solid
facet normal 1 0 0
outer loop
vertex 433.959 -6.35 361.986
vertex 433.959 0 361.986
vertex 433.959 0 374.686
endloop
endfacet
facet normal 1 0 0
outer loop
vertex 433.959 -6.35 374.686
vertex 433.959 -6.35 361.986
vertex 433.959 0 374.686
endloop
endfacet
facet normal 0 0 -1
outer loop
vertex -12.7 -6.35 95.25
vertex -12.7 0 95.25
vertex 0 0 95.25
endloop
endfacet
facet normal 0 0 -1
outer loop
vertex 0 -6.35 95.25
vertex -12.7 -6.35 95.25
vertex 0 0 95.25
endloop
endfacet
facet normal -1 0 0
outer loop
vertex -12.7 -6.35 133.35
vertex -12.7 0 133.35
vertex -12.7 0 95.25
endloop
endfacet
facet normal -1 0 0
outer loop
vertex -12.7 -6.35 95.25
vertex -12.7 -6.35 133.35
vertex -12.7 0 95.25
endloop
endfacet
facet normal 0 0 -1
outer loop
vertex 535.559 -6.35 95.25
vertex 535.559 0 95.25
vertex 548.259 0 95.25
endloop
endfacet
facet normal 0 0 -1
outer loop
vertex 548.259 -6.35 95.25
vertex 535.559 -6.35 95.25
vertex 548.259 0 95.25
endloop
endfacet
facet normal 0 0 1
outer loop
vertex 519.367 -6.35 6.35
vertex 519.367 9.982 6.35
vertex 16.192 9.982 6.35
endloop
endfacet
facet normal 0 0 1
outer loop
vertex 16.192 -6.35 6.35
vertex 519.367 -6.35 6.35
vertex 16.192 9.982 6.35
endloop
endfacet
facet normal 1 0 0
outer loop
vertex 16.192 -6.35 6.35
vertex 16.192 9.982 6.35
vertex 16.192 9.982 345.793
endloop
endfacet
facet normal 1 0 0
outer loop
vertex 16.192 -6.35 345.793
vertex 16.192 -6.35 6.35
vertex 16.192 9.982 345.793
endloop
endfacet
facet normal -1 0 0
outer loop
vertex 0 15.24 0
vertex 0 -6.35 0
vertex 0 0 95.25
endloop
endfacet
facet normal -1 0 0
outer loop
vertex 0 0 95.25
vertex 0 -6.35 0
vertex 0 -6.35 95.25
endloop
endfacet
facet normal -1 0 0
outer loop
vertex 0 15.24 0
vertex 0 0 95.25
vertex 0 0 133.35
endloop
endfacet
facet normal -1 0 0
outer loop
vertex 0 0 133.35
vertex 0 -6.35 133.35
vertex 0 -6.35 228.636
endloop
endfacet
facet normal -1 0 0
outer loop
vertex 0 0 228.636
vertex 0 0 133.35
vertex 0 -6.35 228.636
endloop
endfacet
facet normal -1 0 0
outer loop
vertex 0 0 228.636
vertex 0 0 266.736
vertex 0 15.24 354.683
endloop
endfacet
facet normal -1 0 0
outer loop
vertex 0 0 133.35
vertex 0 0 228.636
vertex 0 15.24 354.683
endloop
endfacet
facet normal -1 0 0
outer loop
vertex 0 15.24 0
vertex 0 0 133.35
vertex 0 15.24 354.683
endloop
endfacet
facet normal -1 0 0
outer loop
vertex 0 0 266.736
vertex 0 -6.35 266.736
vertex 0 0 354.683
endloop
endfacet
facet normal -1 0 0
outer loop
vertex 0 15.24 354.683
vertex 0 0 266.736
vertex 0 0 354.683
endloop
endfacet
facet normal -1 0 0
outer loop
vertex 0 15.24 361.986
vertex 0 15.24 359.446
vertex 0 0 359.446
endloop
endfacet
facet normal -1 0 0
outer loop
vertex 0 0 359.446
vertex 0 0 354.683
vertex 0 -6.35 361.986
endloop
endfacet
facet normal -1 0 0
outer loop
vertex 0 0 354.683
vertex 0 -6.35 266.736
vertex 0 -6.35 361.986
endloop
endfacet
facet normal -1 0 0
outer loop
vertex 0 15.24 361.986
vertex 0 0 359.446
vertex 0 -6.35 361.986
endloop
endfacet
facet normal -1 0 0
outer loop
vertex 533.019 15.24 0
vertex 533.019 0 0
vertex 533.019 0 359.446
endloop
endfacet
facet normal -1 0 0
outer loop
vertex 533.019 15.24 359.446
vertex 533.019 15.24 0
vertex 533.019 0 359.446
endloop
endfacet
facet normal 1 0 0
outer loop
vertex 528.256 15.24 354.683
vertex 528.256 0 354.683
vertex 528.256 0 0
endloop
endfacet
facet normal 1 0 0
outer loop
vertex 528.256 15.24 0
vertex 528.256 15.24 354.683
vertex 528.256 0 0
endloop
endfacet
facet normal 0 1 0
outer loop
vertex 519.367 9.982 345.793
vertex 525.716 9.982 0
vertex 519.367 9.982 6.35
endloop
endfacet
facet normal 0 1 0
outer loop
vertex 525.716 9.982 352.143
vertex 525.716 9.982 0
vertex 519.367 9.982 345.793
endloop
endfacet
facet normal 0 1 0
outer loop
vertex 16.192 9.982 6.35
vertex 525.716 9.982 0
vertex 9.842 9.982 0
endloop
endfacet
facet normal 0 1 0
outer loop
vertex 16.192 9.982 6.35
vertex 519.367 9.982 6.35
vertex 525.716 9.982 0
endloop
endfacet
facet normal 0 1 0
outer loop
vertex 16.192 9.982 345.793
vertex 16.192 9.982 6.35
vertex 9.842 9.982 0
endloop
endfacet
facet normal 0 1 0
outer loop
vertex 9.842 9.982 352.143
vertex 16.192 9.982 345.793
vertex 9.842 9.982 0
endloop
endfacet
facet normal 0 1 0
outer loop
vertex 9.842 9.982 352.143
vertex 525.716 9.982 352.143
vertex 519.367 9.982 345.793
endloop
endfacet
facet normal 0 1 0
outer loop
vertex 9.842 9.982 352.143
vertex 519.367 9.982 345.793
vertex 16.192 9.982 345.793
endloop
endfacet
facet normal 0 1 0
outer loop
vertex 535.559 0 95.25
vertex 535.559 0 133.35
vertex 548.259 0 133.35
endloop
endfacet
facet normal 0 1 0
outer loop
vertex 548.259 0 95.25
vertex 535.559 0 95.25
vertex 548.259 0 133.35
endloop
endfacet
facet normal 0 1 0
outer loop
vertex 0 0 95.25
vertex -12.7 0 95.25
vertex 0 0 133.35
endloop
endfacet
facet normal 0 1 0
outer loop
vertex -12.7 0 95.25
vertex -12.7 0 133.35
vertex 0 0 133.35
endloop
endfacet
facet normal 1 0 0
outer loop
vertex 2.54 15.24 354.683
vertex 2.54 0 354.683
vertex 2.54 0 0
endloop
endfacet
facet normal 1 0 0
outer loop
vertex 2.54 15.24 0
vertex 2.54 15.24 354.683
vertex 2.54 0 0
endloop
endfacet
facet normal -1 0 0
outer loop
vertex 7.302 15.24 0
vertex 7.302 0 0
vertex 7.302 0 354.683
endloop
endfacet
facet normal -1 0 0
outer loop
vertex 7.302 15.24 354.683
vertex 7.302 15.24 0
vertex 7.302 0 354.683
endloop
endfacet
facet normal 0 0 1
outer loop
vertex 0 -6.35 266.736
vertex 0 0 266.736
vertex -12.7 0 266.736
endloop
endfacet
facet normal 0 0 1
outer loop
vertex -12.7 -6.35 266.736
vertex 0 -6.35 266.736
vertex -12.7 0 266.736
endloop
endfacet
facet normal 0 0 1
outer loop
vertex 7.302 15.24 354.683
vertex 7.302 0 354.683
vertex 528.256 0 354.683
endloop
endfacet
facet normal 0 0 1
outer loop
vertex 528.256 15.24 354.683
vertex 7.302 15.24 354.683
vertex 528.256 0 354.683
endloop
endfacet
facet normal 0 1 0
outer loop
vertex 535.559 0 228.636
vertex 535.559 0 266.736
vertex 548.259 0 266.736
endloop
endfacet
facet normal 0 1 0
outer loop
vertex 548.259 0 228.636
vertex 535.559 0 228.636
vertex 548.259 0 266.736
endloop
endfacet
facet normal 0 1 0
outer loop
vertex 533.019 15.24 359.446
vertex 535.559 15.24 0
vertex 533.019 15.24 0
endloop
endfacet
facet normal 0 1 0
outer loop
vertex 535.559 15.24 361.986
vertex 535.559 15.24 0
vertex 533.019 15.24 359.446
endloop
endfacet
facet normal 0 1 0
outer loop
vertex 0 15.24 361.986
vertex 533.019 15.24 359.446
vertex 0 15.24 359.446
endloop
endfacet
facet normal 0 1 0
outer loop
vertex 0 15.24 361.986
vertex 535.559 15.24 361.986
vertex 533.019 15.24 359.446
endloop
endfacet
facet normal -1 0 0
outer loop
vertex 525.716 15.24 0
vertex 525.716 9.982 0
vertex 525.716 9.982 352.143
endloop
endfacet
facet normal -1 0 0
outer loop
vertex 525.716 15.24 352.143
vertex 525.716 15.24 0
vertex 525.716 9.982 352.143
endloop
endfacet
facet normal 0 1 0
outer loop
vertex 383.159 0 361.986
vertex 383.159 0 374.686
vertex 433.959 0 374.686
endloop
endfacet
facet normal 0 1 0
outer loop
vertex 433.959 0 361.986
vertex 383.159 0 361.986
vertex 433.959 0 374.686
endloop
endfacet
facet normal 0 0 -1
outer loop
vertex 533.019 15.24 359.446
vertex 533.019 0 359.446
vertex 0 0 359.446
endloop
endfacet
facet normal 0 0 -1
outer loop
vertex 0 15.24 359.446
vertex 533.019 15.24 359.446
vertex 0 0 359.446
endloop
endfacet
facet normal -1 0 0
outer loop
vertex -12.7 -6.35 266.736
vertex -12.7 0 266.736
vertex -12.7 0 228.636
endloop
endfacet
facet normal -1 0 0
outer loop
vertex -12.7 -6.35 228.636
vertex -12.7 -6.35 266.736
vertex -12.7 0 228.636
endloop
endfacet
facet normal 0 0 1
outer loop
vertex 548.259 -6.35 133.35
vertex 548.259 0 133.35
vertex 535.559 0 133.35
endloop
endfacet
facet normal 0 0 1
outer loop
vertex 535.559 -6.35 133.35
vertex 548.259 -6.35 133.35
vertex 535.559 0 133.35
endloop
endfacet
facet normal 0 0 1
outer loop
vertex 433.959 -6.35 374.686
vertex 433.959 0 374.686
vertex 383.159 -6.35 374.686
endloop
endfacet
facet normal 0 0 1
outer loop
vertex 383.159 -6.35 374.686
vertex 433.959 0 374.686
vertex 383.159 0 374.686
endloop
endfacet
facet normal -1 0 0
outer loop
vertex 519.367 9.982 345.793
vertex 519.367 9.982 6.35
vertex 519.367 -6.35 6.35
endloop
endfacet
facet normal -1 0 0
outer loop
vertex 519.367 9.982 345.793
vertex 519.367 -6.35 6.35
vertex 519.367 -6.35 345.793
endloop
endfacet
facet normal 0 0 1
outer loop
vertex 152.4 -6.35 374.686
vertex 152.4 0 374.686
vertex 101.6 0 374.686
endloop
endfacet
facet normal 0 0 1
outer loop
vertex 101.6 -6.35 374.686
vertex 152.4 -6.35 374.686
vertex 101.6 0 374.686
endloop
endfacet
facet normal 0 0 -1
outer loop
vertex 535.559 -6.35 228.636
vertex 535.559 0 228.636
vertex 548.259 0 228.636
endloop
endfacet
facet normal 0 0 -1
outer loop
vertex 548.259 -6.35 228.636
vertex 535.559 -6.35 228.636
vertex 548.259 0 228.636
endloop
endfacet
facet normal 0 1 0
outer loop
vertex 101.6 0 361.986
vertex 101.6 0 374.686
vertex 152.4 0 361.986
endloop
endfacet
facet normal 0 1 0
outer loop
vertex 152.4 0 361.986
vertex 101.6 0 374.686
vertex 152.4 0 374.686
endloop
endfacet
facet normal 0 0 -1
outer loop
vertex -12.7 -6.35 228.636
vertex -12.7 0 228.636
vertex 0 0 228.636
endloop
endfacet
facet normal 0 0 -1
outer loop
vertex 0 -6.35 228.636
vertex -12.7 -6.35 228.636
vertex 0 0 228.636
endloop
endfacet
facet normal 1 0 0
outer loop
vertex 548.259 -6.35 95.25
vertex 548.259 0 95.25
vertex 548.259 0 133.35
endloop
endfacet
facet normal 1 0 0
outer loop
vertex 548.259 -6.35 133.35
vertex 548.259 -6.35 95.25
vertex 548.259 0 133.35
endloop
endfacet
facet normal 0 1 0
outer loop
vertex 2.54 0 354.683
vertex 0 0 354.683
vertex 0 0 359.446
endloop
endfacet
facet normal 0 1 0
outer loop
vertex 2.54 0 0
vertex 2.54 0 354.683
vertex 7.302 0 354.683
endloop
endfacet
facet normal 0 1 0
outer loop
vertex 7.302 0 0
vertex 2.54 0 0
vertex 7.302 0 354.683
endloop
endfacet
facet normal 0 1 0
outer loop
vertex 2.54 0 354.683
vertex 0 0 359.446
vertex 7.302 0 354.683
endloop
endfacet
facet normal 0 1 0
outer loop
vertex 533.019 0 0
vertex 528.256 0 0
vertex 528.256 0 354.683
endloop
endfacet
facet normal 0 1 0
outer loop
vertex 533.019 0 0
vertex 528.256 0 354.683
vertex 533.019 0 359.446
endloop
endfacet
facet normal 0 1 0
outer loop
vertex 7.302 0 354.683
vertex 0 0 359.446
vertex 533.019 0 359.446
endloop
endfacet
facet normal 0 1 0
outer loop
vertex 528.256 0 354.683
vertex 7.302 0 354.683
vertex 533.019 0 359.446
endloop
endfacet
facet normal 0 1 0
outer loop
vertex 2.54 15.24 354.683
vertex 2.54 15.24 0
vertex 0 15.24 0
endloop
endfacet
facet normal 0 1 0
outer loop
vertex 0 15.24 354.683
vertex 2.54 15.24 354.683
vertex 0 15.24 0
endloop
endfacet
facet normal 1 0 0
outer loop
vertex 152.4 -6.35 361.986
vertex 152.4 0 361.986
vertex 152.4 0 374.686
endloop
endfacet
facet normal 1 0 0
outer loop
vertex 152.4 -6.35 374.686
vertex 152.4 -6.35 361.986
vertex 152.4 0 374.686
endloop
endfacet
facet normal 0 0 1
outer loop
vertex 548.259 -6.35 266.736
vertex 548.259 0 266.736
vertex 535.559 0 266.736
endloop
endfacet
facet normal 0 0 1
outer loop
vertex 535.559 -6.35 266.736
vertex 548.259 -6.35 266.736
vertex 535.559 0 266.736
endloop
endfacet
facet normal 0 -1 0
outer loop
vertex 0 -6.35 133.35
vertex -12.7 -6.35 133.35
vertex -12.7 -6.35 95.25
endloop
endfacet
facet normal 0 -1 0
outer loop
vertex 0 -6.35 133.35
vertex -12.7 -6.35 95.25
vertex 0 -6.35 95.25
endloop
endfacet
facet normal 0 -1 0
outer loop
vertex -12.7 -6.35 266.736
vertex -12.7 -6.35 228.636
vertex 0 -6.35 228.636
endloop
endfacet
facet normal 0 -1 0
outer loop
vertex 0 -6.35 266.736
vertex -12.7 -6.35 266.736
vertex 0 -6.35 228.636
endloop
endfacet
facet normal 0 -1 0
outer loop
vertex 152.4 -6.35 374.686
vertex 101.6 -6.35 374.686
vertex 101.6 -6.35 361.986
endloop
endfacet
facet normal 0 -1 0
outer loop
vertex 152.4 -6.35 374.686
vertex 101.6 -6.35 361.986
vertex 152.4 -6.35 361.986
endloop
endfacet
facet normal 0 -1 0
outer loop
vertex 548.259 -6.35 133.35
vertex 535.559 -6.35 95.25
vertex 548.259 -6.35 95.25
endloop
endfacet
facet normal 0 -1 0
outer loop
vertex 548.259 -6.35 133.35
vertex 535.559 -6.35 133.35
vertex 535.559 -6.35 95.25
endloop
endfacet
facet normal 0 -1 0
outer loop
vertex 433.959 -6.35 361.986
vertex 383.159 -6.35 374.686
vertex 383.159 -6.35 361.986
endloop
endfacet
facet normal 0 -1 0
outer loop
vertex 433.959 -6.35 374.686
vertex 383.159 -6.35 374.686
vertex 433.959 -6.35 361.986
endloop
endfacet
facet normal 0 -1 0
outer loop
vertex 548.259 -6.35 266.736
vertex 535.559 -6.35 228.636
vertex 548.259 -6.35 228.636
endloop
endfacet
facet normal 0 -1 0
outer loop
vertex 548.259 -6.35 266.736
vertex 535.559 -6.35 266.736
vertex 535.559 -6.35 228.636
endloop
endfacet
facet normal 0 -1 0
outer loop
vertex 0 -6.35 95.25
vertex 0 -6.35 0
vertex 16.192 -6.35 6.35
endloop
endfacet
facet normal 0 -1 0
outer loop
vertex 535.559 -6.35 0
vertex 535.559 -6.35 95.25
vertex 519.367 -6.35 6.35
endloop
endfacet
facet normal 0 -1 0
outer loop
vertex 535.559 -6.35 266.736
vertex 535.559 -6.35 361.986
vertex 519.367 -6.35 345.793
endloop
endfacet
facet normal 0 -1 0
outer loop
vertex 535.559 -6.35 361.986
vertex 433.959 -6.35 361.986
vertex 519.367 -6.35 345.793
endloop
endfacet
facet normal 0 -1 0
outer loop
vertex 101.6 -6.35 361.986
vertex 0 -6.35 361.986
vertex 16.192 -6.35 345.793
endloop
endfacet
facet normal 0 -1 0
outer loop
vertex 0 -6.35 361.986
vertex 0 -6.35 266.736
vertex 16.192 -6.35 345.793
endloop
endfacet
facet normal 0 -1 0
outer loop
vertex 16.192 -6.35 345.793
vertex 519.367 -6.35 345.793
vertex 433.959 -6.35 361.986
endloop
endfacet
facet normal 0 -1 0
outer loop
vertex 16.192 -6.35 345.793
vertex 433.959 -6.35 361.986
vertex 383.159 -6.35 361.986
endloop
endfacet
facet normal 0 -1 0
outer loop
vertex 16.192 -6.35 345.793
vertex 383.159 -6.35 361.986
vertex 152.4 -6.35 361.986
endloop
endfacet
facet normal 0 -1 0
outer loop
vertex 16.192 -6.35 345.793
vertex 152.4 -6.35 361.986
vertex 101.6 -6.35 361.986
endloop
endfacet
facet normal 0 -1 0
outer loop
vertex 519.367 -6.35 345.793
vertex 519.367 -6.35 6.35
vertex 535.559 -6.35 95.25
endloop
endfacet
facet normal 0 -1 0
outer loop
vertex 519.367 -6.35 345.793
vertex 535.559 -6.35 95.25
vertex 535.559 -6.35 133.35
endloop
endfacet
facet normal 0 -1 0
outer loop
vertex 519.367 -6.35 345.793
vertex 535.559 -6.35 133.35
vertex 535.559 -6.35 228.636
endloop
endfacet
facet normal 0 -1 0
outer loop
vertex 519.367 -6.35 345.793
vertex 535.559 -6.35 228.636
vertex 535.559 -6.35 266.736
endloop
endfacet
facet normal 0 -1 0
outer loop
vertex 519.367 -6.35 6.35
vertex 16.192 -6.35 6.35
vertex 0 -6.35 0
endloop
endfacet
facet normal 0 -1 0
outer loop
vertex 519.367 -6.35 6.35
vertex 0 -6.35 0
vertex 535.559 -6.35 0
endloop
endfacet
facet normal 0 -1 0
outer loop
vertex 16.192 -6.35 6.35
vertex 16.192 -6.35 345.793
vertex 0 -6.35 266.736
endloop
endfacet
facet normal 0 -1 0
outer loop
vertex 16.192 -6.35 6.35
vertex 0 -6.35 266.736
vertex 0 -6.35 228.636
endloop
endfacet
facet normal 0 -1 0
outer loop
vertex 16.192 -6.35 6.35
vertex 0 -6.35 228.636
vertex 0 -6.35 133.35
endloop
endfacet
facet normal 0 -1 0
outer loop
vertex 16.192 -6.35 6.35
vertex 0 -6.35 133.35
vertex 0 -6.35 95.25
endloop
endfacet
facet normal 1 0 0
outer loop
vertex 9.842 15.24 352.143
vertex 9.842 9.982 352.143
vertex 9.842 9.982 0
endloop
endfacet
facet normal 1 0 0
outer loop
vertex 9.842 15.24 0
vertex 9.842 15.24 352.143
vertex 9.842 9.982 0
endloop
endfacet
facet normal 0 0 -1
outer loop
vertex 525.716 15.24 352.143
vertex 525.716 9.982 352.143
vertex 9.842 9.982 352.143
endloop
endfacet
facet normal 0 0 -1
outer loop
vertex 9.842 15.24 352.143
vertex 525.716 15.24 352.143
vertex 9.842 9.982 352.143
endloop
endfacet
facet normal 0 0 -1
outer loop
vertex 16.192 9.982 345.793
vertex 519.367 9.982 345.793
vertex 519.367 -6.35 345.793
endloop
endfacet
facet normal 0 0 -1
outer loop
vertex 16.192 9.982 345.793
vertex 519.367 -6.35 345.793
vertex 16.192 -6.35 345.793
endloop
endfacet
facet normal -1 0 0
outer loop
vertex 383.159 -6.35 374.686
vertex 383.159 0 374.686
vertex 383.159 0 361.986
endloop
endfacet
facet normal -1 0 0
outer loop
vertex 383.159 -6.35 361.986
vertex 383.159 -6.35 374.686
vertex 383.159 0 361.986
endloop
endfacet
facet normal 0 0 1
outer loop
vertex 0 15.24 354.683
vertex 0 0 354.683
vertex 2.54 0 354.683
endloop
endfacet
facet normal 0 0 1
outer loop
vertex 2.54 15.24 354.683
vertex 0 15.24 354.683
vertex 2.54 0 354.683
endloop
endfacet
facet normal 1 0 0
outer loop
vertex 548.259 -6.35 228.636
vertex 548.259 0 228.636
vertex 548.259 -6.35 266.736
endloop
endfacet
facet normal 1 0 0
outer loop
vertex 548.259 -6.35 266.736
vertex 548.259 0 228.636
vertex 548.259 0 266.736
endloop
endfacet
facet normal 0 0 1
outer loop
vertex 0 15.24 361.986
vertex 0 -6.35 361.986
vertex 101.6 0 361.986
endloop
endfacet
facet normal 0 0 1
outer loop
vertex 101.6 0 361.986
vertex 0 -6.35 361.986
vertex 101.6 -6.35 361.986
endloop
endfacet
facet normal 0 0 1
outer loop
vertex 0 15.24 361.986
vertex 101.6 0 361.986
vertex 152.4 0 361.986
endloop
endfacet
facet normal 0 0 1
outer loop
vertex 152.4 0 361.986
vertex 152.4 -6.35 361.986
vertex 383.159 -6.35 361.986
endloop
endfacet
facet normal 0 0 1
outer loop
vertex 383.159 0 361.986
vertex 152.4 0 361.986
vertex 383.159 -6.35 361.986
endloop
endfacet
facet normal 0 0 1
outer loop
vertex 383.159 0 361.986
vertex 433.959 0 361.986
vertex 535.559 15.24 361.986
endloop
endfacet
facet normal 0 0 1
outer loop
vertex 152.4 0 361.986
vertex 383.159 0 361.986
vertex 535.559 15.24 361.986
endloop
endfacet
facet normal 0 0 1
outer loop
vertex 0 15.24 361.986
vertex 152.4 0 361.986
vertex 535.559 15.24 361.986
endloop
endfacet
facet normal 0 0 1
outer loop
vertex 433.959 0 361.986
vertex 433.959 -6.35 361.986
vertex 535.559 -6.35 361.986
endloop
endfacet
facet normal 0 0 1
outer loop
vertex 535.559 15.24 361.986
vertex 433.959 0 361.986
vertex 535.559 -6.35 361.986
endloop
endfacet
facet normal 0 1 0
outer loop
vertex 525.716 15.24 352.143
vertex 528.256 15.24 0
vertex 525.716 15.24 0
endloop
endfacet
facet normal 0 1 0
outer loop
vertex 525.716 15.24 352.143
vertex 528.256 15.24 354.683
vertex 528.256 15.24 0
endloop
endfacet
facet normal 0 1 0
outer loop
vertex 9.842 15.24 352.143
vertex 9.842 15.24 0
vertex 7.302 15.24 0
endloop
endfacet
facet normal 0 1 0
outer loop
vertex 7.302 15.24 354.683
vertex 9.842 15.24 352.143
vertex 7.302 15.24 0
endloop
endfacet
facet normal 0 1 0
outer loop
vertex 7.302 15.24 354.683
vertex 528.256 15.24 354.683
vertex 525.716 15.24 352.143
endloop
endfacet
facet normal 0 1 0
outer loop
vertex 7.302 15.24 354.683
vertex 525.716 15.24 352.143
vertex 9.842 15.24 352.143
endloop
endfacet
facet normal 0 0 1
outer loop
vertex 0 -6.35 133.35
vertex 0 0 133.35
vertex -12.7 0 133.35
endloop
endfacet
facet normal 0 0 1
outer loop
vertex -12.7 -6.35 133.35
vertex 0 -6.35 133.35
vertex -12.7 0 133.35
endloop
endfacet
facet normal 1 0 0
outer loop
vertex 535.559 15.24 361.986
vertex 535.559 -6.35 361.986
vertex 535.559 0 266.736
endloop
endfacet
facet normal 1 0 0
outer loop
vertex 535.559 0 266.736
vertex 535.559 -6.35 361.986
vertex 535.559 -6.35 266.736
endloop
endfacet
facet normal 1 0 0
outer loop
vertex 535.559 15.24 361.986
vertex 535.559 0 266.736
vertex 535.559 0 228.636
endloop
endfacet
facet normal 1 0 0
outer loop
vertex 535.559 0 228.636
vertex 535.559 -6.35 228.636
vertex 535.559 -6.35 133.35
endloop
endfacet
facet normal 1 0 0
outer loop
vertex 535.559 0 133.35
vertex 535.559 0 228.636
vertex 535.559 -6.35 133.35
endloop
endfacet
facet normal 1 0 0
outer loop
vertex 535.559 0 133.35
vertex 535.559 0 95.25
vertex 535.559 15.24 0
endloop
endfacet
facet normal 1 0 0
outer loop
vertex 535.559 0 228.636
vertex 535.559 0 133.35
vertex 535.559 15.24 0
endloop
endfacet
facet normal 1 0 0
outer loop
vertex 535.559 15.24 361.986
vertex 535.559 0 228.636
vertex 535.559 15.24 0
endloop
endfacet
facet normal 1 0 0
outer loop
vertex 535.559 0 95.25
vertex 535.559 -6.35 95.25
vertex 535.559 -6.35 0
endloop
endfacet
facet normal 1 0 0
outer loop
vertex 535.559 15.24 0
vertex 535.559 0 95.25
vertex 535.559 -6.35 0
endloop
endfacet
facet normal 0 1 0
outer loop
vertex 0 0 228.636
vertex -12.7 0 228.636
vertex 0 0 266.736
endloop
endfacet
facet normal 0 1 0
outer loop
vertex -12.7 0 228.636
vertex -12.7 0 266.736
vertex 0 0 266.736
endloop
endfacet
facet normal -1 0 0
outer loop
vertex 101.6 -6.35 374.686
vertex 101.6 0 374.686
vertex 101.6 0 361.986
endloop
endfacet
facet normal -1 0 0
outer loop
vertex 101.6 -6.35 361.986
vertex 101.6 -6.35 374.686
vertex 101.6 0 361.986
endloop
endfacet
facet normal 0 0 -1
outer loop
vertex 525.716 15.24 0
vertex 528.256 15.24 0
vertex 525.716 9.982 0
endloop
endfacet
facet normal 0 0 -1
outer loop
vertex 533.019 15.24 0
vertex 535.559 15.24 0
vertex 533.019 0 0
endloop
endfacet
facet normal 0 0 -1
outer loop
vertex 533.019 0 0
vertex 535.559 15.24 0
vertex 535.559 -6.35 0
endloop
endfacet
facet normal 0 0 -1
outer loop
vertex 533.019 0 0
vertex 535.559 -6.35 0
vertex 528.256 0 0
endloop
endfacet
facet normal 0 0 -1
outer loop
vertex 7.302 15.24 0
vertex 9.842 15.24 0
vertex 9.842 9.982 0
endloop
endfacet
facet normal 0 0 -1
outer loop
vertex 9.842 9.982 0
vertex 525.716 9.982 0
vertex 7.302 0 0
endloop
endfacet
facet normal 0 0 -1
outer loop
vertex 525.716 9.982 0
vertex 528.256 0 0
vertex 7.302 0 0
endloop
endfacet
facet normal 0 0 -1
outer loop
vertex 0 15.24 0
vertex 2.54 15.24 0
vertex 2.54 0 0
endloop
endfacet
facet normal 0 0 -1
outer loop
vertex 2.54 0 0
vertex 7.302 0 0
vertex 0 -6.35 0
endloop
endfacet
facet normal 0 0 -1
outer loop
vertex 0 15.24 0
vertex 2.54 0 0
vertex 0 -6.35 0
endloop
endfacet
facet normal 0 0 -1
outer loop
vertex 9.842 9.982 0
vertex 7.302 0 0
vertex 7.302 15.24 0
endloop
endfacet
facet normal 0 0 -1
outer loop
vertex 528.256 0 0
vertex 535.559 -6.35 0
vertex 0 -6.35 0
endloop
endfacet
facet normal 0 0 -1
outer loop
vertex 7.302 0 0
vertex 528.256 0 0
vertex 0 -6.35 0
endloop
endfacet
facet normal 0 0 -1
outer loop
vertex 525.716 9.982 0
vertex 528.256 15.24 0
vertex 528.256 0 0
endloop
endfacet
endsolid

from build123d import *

# Parameters (mm, degrees)
F1_DEPTH = 6.35
F3_DEPTH = 15.24
F4_W     = 515.874
F4_H     = 352.143454
F5_DEPTH = 9.9822
F6_W     = 503.174003
F6_H     = 339.443454
F7_DEPTH = 16.3332


with BuildPart() as f1:
    # F0 (on Front) → F1 (new body)
    with BuildSketch(Plane.XZ):
        Polygon((0, 95.25), (0, 0), (535.559, 0), (535.559, 95.25), (548.259, 95.25), (548.259, 133.35), (535.559, 133.35), (535.559, 228.635954), (548.259, 228.635954), (548.259, 266.735954), (535.559, 266.735954), (535.559, 361.985954), (433.959, 361.985954), (433.959, 374.685954), (383.159, 374.685954), (383.159, 361.985954), (152.4, 361.985954), (152.4, 374.685954), (101.6, 374.685954), (101.6, 361.985954), (0, 361.985954), (0, 266.735954), (-12.7, 266.735954), (-12.7, 228.635954), (0, 228.635954), (0, 133.35), (-12.7, 133.35), (-12.7, 95.25), align=None)
    extrude(amount=F1_DEPTH)

    # F2 (on face) → F3 (join)
    with BuildSketch(Plane(origin=(0, 0, 0), x_dir=(-1, 0, 0), z_dir=(0, 1, 0))):
        Polygon((0, 361.985954), (-535.559, 361.985954), (-535.559, 359.445954), (-535.559, 354.683454), (-535.559, 352.143454), (-535.559, 0), (-533.019, 0), (-533.019, 352.143454), (-533.019, 354.683454), (-533.019, 359.445954), (-2.54, 359.445954), (0, 359.445954), align=None)
        Polygon((0, 352.143454), (0, 354.683454), (-2.54, 354.683454), (-2.54, 352.143454), (-2.54, 0), (0, 0), align=None)
        Polygon((-528.2565, 352.143454), (-528.2565, 0), (-525.7165, 0), (-525.7165, 352.143454), (-9.8425, 352.143454), (-9.8425, 0), (-7.3025, 0), (-7.3025, 352.143454), (-7.3025, 354.683454), (-528.2565, 354.683454), align=None)
    extrude(amount=F3_DEPTH)

    # F4 (on face) → F5 (join)
    with BuildSketch(Plane(origin=(0, 0, 0), x_dir=(-1, 0, 0), z_dir=(0, 1, 0))):
        with Locations((-267.7795, 176.071727)):
            Rectangle(F4_W, F4_H)
    extrude(amount=F5_DEPTH)

    # F6 (on face) → F7 (cut, through all)
    with BuildSketch(Plane(origin=(0, 9.9822, 0), x_dir=(-1, 0, 0), z_dir=(0, 1, 0))):
        with Locations((-267.779501, 176.071727)):
            Rectangle(F6_W, F6_H)
    extrude(amount=-F7_DEPTH, mode=Mode.SUBTRACT)


solid = f1.part
